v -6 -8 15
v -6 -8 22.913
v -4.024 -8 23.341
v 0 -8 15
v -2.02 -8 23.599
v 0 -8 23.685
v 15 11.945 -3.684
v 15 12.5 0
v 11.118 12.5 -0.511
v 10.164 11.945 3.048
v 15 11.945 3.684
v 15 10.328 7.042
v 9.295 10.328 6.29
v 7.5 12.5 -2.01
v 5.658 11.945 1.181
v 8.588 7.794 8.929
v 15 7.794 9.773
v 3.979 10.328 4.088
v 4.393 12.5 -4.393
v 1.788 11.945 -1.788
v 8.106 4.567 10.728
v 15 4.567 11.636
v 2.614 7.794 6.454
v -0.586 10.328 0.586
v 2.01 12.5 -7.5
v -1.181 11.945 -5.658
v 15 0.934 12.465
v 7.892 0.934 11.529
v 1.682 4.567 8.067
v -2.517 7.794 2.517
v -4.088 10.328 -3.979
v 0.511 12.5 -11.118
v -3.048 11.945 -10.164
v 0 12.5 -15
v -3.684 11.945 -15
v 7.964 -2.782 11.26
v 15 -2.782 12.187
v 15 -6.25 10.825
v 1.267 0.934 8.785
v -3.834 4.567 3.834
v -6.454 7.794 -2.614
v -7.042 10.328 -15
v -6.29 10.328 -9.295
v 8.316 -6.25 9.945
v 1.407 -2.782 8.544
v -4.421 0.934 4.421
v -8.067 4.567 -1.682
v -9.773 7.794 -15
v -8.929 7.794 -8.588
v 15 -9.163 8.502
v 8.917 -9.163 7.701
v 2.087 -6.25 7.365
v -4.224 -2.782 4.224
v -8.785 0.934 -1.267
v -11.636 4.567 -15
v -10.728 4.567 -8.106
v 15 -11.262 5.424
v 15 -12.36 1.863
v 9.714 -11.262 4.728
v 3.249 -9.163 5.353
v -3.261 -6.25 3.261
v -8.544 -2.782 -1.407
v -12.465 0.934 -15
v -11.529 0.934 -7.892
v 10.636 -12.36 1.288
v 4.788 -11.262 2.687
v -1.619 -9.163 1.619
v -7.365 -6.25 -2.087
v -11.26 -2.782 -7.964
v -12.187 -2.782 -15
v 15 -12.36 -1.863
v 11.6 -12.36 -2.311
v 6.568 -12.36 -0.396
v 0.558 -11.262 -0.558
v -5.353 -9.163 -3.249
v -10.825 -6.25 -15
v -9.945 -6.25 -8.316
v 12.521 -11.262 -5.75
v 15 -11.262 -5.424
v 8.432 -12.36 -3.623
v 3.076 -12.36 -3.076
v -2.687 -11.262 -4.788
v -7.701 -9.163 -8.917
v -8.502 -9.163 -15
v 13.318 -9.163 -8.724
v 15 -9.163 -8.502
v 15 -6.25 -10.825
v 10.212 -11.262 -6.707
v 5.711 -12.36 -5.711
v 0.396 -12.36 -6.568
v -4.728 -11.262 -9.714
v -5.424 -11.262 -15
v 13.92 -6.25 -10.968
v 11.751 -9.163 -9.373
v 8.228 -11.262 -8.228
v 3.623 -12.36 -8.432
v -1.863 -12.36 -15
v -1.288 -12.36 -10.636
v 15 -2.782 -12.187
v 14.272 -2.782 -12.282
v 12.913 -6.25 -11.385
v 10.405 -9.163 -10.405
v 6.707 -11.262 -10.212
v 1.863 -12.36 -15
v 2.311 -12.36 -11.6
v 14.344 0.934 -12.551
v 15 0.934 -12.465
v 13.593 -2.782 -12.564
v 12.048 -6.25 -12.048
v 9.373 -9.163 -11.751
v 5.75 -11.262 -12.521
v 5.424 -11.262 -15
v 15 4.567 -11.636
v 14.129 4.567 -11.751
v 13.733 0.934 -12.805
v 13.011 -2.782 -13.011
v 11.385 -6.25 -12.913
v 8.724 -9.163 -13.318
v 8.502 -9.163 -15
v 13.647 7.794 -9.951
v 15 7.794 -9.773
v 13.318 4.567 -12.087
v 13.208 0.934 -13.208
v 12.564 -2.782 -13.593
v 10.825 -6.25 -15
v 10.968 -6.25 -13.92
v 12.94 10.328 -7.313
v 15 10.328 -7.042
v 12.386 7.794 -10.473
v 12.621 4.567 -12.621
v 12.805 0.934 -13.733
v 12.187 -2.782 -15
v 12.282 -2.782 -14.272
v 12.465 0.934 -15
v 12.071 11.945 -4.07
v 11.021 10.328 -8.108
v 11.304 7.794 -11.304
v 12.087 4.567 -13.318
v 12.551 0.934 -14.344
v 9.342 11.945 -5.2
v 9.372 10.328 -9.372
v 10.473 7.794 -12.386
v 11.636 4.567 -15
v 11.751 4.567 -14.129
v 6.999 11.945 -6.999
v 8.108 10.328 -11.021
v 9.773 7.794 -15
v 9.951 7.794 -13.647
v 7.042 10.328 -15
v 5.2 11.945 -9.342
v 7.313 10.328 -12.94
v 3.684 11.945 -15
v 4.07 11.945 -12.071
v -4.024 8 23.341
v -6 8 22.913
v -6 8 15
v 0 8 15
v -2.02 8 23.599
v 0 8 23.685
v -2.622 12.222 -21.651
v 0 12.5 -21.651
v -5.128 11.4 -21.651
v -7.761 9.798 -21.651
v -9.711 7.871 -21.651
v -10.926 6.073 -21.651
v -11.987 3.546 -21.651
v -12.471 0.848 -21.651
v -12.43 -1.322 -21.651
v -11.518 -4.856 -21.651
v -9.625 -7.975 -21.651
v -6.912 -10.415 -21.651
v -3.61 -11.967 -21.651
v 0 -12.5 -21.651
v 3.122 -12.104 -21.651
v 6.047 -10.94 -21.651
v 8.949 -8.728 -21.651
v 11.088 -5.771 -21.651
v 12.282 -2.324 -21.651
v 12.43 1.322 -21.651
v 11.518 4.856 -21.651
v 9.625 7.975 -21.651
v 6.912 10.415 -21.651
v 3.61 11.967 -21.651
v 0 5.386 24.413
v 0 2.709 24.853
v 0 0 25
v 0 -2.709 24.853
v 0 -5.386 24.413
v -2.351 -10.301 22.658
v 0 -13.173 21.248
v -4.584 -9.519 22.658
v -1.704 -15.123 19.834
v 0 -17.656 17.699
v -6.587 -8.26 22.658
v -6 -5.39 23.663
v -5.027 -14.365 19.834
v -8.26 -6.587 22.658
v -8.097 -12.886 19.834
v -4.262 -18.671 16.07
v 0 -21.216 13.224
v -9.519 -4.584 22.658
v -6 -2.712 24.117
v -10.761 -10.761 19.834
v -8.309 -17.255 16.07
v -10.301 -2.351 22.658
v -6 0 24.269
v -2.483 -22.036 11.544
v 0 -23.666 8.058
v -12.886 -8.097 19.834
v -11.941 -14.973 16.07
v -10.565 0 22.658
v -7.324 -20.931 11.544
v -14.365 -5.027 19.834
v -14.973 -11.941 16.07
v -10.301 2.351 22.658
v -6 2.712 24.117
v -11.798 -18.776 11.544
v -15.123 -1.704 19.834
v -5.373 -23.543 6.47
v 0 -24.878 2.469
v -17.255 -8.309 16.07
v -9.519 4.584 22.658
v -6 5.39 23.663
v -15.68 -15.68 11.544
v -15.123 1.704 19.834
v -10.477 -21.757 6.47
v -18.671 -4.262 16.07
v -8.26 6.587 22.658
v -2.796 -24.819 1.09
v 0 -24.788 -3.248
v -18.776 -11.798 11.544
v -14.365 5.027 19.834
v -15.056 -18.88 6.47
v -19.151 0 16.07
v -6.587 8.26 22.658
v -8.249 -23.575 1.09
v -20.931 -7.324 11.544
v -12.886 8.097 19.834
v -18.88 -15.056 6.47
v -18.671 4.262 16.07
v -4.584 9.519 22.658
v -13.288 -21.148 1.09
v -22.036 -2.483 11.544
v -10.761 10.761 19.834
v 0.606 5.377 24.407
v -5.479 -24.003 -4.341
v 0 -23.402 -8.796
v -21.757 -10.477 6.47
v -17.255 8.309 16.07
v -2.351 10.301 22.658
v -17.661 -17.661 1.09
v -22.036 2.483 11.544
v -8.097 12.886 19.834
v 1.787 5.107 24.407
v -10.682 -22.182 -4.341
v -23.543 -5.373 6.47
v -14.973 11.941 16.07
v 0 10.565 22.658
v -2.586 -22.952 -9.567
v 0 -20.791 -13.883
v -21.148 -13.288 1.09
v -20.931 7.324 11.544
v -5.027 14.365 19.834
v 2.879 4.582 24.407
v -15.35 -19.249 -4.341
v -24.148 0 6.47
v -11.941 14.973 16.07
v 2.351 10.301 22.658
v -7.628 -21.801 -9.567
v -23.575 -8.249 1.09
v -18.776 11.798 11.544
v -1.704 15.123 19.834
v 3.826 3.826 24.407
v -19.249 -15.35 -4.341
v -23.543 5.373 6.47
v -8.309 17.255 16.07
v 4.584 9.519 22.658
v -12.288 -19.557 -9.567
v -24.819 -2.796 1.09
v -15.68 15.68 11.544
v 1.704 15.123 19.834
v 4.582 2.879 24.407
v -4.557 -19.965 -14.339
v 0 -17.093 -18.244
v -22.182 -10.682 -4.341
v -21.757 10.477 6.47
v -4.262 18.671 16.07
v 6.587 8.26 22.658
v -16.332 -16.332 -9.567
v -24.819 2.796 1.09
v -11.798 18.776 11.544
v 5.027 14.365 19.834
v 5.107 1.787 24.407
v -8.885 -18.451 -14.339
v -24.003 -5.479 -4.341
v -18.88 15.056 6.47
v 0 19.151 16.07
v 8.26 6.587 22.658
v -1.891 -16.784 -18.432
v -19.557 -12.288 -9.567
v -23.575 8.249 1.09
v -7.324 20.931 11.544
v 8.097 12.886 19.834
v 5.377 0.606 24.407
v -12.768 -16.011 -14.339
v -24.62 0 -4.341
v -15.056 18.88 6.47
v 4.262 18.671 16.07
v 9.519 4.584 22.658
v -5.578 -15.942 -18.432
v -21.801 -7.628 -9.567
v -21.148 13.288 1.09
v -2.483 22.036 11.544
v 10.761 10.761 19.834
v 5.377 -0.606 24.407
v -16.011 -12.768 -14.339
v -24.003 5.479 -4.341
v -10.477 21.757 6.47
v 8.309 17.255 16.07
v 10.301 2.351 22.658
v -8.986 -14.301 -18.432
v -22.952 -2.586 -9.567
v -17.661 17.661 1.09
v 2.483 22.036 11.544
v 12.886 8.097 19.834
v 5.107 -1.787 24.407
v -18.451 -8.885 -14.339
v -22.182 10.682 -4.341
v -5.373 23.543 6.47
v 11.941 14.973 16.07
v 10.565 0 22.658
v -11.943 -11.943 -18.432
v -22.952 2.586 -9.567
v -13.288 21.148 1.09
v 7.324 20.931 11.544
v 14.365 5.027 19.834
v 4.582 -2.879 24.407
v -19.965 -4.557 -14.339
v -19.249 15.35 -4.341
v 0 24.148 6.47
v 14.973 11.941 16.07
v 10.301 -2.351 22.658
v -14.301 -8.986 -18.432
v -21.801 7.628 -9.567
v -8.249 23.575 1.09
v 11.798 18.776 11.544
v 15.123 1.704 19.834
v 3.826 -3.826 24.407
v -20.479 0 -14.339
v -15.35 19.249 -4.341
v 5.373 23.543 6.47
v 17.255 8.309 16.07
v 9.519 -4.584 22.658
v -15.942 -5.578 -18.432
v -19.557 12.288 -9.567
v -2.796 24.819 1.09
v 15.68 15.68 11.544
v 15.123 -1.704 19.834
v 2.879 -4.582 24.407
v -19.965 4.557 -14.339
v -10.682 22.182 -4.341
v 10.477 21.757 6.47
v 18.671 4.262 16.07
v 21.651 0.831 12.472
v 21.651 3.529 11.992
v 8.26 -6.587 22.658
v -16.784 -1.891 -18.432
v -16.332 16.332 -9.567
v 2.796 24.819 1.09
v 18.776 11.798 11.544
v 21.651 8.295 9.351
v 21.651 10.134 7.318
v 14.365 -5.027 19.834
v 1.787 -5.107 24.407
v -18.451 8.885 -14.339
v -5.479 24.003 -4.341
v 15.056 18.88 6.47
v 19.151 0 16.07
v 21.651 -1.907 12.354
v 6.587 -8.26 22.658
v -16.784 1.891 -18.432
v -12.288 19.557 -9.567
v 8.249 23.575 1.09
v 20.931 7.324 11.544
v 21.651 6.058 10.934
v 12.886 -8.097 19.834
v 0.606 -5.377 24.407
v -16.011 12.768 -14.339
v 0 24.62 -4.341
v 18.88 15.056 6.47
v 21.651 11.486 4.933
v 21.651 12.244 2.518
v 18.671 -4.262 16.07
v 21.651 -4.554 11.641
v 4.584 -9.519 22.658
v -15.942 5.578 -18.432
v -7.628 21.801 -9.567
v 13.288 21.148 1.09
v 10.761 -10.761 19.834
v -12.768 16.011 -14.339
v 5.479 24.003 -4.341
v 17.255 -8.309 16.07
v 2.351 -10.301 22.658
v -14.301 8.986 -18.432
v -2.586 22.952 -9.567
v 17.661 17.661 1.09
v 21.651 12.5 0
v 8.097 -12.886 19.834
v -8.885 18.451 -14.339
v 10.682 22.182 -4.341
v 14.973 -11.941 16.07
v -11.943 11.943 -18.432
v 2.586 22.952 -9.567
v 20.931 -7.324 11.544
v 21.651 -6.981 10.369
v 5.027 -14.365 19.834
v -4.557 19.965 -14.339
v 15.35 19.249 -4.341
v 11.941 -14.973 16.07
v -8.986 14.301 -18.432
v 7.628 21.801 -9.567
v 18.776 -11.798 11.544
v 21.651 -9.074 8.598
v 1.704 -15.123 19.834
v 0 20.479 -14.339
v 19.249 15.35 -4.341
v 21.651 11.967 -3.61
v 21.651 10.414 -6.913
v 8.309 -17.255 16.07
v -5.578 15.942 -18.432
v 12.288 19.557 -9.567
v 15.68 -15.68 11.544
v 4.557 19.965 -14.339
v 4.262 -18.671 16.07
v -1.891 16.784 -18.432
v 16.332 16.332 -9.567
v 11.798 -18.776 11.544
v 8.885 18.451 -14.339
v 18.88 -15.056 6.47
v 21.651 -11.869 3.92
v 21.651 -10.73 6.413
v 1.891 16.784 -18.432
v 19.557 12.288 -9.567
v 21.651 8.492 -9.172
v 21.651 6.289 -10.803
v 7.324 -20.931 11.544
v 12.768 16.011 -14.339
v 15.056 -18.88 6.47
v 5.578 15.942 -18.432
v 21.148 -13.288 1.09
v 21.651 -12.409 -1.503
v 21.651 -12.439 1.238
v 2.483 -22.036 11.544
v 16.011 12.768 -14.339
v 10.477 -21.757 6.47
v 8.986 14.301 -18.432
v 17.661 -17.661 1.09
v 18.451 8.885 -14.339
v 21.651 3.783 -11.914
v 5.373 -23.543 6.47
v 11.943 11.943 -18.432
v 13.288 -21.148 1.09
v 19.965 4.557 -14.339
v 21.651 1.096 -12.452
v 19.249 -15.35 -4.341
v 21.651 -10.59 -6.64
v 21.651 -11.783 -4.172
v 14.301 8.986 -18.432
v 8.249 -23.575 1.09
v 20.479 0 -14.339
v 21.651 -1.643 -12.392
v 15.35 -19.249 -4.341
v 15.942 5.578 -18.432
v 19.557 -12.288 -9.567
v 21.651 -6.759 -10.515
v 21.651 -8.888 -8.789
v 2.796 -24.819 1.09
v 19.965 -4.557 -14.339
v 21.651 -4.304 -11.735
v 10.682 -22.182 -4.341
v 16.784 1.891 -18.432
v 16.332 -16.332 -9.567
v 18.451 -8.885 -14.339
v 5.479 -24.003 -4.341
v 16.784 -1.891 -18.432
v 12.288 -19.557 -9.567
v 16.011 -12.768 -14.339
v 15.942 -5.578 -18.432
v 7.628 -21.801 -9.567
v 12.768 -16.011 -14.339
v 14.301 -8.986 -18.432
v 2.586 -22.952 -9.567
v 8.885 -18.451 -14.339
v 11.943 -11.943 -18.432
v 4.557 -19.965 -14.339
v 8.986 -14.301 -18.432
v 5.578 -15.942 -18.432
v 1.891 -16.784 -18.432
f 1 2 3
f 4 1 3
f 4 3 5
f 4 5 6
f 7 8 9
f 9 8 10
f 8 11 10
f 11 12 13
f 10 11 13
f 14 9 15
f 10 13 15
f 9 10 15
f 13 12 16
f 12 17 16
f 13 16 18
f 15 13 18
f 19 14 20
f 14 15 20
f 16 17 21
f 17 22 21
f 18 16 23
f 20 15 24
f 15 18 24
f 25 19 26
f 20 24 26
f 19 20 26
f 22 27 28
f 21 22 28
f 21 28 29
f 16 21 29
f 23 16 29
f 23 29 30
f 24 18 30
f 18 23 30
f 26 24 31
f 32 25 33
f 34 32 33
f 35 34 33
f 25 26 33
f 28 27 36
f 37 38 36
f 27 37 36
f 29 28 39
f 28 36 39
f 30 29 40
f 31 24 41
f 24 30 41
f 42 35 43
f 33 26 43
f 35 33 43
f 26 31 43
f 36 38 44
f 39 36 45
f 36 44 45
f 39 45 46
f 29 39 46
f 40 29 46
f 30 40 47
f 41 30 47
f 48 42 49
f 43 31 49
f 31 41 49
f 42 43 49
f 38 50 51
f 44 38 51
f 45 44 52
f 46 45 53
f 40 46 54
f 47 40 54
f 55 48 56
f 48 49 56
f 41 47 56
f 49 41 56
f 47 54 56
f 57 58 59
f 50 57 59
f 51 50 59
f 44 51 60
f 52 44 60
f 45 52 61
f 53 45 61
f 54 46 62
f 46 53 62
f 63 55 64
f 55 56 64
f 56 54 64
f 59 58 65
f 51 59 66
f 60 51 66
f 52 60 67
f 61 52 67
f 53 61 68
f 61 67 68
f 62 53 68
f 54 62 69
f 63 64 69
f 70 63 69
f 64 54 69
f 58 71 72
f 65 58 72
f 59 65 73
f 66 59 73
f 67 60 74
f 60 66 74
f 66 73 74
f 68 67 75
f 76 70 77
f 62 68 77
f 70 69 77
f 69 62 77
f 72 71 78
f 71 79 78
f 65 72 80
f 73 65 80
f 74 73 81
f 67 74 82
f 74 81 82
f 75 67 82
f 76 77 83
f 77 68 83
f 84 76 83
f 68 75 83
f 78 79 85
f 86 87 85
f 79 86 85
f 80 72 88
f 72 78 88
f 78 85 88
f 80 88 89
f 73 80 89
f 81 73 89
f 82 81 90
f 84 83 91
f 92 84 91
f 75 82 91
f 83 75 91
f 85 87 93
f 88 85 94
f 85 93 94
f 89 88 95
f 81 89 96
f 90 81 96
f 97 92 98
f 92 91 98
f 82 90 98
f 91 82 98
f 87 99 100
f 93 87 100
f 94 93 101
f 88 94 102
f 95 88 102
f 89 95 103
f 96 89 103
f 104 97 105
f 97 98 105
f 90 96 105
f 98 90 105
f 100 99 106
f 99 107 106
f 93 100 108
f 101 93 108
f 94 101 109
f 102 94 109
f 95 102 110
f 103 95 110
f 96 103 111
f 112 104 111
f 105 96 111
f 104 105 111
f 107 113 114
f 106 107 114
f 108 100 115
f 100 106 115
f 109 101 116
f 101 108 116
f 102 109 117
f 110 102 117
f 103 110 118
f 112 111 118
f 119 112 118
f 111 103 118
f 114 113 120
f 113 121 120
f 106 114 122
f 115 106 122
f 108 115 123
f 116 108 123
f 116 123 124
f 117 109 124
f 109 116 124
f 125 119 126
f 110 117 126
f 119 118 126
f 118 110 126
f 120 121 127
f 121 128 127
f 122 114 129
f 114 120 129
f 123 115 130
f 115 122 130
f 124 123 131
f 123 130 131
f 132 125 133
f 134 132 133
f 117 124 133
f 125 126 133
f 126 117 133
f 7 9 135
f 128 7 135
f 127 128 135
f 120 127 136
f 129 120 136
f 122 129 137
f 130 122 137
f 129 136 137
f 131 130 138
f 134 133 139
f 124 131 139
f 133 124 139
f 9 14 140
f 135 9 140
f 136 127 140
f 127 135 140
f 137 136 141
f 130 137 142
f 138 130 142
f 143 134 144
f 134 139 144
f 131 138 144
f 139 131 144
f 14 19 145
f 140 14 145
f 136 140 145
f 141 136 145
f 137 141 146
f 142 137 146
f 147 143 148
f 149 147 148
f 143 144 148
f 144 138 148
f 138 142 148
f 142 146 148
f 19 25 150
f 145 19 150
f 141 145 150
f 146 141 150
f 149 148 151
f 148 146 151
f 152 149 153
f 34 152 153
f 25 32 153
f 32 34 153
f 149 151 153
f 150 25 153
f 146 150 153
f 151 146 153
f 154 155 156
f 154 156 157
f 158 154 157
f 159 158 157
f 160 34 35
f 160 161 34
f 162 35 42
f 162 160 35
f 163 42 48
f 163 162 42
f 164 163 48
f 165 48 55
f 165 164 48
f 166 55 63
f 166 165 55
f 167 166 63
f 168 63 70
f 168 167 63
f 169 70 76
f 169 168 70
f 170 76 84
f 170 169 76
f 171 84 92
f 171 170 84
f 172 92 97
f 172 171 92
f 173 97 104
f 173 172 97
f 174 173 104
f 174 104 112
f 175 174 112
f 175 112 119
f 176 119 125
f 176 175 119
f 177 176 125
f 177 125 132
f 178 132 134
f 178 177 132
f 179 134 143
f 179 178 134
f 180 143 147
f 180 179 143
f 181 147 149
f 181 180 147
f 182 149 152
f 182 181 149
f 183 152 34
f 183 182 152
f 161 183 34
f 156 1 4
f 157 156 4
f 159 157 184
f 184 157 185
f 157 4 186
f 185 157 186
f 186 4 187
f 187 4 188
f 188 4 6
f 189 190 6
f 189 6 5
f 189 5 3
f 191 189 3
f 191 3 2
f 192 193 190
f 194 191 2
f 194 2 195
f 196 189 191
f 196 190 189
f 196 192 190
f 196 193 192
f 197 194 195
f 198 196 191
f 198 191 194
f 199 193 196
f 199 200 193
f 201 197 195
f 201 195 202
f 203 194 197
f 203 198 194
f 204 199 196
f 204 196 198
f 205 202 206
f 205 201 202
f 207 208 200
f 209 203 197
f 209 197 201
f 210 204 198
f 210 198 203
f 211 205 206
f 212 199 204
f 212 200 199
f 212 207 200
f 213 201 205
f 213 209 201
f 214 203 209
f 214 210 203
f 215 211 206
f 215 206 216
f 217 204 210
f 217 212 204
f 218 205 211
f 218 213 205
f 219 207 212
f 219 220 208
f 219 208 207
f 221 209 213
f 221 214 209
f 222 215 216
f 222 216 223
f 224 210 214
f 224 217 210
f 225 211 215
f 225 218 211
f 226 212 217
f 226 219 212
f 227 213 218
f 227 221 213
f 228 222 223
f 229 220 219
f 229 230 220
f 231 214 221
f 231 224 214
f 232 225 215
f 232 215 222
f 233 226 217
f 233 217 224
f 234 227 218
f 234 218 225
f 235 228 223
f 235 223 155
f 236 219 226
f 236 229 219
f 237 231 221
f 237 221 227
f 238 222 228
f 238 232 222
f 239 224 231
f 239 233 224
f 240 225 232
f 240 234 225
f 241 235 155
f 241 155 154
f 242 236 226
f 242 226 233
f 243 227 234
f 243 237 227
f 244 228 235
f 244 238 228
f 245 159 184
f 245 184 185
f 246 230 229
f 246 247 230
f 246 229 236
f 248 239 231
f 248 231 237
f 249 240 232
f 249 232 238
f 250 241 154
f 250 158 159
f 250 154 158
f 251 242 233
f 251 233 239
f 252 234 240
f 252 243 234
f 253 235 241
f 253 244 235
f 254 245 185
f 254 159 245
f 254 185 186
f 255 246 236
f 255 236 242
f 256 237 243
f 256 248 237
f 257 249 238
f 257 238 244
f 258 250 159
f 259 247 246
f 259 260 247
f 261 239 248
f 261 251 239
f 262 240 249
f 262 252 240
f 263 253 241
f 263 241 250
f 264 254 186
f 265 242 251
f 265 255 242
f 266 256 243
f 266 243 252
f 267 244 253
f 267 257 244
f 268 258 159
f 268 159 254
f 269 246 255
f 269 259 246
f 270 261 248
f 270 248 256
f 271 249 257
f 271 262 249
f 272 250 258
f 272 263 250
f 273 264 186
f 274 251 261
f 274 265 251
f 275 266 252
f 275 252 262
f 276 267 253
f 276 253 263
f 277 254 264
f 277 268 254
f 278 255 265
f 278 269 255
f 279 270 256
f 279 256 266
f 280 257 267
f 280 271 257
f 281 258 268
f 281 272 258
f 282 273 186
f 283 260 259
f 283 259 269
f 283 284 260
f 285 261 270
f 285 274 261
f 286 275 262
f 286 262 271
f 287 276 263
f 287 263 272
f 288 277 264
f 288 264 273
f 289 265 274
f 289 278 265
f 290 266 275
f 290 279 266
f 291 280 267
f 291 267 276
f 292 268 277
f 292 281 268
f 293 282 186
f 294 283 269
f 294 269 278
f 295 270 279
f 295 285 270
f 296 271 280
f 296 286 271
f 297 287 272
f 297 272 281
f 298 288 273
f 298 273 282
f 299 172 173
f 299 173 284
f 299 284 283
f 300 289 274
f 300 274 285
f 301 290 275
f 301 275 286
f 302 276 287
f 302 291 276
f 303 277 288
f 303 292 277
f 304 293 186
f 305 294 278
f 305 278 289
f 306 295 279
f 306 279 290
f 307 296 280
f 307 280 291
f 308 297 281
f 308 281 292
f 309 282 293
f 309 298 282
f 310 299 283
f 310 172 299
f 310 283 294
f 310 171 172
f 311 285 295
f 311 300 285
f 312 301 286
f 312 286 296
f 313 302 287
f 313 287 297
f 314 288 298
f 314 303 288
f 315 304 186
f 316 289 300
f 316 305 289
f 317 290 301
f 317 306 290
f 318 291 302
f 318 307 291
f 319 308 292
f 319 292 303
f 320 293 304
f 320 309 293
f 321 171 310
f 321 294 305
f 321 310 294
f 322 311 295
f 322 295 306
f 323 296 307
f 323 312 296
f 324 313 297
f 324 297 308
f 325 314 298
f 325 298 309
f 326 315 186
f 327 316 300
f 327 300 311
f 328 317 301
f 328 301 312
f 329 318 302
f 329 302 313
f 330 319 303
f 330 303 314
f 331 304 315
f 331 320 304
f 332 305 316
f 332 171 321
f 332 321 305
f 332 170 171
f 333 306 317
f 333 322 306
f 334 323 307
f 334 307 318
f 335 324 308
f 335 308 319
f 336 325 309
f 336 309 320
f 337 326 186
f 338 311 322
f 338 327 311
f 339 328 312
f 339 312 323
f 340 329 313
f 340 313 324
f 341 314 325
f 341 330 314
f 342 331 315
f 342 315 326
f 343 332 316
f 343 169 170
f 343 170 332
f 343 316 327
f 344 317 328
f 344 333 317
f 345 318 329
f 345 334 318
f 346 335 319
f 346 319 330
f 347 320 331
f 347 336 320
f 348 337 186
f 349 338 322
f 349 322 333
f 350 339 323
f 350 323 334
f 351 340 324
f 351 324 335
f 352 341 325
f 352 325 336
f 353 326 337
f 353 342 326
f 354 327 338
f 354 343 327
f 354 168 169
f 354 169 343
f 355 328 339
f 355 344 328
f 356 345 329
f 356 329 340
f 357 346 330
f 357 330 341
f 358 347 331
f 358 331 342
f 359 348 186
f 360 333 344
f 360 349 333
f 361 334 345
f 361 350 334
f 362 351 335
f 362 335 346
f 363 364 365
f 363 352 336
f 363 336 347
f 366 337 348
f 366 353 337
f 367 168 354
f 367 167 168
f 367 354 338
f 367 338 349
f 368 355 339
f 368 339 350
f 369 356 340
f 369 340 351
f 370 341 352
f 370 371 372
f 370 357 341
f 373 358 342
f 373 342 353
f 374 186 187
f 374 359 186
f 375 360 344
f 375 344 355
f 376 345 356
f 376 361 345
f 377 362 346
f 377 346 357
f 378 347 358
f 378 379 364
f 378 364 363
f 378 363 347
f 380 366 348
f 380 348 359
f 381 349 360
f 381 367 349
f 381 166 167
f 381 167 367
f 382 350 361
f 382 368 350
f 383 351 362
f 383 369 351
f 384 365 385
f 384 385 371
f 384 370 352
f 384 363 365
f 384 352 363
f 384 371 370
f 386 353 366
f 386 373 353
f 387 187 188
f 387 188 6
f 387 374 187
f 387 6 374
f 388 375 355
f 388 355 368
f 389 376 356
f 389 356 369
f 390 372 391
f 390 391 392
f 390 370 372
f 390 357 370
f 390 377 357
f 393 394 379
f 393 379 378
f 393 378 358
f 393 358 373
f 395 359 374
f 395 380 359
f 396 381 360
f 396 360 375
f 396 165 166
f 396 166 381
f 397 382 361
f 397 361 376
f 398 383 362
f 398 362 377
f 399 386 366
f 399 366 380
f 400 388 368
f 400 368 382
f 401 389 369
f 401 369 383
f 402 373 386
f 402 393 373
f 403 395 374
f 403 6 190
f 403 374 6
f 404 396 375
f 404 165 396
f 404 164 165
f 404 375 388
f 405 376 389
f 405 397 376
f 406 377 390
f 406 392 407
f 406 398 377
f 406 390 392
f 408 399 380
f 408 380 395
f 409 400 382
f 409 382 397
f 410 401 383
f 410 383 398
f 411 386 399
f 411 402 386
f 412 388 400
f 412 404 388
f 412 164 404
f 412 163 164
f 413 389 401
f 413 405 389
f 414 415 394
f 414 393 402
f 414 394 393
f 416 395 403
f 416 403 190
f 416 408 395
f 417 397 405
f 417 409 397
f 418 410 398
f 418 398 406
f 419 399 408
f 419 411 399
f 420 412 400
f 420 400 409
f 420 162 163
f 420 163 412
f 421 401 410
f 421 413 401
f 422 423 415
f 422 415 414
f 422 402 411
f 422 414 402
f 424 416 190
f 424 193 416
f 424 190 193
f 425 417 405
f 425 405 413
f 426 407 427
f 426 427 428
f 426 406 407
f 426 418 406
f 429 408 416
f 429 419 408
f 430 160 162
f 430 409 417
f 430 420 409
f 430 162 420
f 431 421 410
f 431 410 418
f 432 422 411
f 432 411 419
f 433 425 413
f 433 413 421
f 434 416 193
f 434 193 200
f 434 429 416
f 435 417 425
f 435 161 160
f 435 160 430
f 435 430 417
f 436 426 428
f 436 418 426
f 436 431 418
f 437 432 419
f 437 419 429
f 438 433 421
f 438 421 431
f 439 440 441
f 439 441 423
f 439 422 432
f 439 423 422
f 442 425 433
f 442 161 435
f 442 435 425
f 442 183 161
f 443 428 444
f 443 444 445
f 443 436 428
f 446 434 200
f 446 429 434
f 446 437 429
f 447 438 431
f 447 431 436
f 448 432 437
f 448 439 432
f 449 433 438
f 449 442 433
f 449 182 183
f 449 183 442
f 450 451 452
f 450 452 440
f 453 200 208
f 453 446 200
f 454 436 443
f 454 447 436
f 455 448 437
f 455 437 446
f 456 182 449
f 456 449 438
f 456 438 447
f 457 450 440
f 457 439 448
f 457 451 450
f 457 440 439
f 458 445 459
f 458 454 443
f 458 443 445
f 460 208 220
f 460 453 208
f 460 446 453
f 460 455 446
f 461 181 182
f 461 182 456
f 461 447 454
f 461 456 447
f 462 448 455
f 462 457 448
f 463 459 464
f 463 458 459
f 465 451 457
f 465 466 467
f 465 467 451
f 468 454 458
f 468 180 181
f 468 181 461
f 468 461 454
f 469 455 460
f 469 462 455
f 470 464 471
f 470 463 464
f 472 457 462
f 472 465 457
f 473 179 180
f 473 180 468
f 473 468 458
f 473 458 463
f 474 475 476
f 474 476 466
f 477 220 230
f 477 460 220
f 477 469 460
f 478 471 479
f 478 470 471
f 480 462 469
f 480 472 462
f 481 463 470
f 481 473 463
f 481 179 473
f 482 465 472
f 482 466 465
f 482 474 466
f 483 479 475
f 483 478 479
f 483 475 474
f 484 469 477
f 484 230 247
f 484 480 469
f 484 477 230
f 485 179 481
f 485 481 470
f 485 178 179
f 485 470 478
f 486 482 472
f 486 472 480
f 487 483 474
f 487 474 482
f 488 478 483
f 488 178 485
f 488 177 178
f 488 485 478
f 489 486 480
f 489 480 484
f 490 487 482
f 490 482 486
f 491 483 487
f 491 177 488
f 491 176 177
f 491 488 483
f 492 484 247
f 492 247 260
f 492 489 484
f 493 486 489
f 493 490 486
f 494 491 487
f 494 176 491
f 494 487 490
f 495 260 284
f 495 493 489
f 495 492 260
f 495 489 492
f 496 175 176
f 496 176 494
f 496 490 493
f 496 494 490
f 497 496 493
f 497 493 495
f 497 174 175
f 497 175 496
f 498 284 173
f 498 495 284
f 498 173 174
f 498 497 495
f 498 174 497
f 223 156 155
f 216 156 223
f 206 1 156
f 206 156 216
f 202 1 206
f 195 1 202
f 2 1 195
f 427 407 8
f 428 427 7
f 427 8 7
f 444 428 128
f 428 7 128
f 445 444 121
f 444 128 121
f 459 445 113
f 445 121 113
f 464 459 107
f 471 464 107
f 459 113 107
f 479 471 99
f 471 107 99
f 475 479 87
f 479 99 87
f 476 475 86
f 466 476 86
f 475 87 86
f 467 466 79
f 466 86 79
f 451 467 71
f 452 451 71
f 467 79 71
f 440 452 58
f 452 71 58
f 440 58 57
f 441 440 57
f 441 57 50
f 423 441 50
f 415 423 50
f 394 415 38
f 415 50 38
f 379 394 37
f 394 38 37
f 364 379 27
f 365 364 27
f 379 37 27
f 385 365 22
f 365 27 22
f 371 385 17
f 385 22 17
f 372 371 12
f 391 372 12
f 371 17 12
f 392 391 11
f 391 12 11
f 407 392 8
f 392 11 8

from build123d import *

# Parameters (mm, degrees)
F3_R     = 12.5
F4_W     = 6
F4_H     = 10
F6_DEPTH = 8


with BuildPart() as f1:
    # F0 (on Right) → F1 (revolve)
    with BuildSketch(Plane.YZ):
        with BuildLine():
            Line((0, -25), (0, 25))
            ThreePointArc((0, 25), (-25, 0), (0, -25))
        make_face()
    revolve(axis=Axis((0, 0, 0), (0, 0, -1)))

    # F5: sweep along a path in F4
    with BuildLine(Plane.XZ) as f5_path:
        Line((25, 0), (15, 0))
        ThreePointArc((15, 0), (4.393398, -4.393398), (0, -15))
        Line((0, -15), (0, -25.968151))
    # F3 (on offset) → F5 (sweep, cut)
    with BuildSketch(Plane.YZ.offset(25)):
        Circle(F3_R)
    sweep(path=f5_path.line, mode=Mode.SUBTRACT)

    # F4 (on Front) → F6 (cut, symmetric)
    with BuildSketch(Plane.XZ):
        with Locations((-3, 20)):
            Rectangle(F4_W, F4_H)
    extrude(amount=F6_DEPTH, both=True, mode=Mode.SUBTRACT)


solid = f1.part
